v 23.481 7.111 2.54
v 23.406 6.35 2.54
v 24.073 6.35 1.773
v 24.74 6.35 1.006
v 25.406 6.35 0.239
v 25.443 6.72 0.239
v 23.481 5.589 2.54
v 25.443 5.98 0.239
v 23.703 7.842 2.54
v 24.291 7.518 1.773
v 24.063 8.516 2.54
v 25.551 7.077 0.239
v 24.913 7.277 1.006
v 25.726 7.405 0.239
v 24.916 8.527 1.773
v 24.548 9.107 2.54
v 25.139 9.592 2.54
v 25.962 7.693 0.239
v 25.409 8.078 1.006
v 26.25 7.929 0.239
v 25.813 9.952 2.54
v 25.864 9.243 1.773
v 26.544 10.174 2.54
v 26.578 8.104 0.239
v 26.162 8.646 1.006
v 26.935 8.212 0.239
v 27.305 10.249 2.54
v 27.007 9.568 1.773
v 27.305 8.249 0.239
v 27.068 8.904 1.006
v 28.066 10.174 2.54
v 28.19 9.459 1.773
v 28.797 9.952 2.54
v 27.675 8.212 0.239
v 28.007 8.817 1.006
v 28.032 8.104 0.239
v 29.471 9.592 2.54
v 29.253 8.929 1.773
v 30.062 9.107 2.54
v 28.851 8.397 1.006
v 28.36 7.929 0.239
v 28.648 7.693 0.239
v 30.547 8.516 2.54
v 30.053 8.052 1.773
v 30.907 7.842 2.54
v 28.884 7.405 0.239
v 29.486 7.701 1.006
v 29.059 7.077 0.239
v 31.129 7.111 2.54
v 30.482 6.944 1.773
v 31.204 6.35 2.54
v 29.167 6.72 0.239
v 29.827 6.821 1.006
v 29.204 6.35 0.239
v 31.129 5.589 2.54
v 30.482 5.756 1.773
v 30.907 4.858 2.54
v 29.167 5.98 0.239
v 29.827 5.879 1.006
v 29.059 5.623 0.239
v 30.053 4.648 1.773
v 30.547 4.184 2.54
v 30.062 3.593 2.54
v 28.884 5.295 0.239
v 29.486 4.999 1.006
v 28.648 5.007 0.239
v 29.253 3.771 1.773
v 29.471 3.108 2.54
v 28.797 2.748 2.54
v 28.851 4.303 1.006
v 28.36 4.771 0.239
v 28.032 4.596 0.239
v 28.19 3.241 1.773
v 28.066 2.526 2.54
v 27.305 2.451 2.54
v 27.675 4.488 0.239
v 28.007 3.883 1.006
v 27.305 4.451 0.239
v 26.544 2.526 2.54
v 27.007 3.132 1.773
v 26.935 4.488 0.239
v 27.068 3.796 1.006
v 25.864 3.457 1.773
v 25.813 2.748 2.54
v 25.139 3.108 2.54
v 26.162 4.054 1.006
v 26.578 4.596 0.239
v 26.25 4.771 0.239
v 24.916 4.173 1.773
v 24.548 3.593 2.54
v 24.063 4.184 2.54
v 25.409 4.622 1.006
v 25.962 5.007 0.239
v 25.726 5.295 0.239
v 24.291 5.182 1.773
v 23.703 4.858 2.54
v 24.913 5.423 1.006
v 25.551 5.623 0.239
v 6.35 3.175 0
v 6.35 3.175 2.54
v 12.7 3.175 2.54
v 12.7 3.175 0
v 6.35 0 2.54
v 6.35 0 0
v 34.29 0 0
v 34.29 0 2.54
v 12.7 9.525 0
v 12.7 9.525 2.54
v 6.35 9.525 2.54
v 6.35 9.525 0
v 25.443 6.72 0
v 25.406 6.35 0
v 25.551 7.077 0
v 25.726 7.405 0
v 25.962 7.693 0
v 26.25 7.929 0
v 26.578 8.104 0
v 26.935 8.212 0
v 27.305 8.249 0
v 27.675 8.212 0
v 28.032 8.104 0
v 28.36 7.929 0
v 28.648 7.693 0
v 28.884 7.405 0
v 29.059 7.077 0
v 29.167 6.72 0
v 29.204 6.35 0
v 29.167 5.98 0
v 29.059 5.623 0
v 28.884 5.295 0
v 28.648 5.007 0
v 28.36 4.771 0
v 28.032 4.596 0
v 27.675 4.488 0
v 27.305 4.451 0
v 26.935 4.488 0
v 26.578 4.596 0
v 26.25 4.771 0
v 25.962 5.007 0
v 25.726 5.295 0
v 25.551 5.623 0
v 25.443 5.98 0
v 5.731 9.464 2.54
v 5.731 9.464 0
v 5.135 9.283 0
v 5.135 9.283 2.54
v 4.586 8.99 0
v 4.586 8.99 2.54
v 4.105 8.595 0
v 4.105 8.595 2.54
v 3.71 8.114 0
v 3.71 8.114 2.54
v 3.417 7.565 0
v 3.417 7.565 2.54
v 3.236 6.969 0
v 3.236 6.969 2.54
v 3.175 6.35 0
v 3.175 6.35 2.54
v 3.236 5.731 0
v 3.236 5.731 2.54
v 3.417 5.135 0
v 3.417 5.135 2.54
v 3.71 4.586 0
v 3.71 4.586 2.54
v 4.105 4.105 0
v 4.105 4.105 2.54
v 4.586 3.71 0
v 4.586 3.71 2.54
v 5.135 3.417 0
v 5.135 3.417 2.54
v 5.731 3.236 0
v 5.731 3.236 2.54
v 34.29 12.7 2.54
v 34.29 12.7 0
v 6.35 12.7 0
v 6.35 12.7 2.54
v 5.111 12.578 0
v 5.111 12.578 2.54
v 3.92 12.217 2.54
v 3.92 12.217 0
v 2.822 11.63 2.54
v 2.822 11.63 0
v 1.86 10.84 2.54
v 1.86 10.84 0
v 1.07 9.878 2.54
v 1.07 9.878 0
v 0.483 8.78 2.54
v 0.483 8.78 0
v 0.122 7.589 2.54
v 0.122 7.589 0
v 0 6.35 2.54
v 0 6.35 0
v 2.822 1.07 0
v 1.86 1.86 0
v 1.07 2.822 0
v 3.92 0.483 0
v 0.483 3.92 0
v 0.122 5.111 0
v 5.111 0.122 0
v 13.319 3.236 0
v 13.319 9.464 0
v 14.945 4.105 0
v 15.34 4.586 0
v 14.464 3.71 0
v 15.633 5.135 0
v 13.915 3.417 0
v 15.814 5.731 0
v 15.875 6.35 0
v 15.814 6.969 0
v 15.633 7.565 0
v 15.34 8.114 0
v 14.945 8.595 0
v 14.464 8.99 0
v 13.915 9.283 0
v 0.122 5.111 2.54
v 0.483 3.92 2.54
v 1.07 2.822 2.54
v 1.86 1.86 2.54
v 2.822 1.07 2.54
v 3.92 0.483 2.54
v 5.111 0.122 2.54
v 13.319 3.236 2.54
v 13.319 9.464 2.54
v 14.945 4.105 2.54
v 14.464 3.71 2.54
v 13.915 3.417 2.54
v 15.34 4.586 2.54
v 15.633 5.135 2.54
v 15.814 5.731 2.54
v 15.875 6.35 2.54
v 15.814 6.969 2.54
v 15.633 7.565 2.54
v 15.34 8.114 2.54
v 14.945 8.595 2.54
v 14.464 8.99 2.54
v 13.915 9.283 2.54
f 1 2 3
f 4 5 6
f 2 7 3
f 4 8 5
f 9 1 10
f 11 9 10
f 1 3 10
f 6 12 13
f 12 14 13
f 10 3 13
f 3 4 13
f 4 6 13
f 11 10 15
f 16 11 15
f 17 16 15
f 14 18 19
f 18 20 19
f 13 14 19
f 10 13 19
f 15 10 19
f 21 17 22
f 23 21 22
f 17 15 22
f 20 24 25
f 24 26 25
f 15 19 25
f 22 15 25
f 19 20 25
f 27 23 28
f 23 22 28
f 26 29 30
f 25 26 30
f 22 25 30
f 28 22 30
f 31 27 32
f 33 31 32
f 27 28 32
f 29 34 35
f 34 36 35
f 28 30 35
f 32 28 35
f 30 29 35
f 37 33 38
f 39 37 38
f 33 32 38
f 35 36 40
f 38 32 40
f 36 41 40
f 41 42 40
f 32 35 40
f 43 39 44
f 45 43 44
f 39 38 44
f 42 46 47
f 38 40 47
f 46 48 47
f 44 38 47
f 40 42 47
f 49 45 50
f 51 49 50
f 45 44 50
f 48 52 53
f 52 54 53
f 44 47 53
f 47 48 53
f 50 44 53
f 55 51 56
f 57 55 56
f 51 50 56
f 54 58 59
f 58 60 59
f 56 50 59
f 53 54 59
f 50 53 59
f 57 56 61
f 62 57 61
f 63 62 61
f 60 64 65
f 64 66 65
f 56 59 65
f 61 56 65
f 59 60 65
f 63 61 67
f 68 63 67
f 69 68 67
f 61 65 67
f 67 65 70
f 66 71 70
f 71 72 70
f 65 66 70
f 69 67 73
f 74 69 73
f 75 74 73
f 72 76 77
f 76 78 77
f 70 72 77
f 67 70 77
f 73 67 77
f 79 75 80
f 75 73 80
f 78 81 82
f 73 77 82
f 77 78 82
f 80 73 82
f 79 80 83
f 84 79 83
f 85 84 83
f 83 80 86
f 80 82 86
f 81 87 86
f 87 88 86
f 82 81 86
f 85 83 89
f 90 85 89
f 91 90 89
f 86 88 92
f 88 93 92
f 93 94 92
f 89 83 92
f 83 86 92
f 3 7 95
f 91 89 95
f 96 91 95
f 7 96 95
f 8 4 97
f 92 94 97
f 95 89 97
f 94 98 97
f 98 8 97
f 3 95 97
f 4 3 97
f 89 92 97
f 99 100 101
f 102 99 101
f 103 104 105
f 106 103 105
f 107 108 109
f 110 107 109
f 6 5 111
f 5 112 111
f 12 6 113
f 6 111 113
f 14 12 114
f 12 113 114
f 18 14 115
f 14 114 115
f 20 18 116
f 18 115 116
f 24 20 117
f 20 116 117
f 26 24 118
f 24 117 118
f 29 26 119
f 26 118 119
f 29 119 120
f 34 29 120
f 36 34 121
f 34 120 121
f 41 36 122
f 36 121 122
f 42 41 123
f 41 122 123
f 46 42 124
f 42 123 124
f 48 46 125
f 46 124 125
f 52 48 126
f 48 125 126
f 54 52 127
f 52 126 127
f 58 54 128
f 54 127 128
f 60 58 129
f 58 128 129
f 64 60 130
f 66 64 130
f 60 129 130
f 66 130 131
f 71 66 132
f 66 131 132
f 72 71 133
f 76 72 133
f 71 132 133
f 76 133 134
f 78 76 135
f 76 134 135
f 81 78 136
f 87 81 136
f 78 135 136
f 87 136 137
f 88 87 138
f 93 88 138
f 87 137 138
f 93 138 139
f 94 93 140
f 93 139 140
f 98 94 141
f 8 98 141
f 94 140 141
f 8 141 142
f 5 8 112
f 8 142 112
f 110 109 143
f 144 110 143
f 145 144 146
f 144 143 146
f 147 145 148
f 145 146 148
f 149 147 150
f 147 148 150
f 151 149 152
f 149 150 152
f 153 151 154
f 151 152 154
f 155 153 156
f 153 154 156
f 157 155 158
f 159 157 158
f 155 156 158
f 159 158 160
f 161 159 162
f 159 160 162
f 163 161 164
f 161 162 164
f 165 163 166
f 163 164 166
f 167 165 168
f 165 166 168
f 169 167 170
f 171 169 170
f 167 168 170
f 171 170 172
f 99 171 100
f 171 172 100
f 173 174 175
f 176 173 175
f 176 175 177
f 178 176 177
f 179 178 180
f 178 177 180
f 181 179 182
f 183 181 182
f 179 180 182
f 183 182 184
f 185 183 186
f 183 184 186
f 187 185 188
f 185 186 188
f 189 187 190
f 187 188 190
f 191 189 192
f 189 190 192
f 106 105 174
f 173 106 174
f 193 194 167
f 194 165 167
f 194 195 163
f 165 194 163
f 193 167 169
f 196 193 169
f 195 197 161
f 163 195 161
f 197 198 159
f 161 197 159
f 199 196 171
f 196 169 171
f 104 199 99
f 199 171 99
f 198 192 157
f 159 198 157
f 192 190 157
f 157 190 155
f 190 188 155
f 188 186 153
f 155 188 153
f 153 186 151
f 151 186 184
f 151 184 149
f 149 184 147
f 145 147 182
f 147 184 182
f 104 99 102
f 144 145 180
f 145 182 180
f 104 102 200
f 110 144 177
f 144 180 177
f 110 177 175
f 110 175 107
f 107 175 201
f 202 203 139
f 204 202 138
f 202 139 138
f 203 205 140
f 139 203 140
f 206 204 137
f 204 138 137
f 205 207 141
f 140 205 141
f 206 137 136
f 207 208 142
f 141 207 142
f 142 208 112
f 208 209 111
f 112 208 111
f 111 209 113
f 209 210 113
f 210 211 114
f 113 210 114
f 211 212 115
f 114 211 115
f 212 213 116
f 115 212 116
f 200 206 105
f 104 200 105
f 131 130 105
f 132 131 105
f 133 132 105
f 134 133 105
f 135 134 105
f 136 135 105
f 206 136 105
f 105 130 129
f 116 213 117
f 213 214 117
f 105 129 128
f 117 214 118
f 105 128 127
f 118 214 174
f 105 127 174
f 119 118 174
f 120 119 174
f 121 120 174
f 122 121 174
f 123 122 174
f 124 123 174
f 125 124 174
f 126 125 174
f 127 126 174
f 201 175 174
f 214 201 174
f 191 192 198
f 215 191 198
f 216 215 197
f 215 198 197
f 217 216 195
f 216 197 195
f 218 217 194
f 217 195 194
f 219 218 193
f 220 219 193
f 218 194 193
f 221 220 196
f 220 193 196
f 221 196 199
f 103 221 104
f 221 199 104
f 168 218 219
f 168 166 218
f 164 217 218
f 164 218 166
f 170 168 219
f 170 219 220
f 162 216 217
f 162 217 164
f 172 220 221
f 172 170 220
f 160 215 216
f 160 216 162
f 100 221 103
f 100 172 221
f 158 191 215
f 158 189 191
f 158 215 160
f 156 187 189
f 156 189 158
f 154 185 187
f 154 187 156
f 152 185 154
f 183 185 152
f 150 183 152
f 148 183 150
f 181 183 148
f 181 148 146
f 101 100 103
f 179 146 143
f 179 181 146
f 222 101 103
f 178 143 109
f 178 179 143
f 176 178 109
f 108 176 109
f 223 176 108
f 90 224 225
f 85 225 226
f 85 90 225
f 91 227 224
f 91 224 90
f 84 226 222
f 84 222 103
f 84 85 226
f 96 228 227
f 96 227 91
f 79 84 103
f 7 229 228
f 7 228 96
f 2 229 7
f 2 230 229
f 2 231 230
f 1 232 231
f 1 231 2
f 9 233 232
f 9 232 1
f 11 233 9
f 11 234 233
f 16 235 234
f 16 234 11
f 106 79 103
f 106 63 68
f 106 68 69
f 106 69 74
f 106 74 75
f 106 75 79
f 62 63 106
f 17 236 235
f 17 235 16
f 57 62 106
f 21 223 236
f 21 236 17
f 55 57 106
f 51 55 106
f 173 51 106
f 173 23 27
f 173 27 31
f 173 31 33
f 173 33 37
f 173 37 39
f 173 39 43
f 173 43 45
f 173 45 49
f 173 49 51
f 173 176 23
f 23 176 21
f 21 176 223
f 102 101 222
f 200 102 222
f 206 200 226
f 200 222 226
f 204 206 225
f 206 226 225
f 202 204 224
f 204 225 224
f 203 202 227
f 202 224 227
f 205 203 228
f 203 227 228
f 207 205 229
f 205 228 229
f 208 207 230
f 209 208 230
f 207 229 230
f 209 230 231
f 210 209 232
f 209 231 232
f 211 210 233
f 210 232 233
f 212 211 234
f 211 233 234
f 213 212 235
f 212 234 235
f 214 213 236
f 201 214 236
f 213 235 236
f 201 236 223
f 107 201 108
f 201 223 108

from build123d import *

# Parameters (mm, degrees)
F1_DEPTH       = 2.54
F3_DEPTH       = 2.541
F5_D           = 3.7973
F5_CSINK_D     = 7.7978
F5_CSINK_ANGLE = 82


with BuildPart() as f1:
    # F0 (on Top) → F1 (new body)
    with BuildSketch(Plane.XY):
        with BuildLine():
            ThreePointArc((0, 6.35), (1.8598719395, 1.8598719395), (6.35, 0))
            Line((6.35, 0), (34.29, 0))
            Line((34.29, 0), (34.29, 12.7))
            Line((34.29, 12.7), (6.35, 12.7))
            ThreePointArc((6.35, 12.7), (1.8598719395, 10.8401280605), (0, 6.35))
        make_face()
    extrude(amount=F1_DEPTH)

    # F2 (on face) → F3 (cut, through all)
    with BuildSketch(Plane.XY.offset(2.54)):
        with BuildLine():
            Line((12.7, 9.525), (6.35, 9.525))
            ThreePointArc((6.35, 9.525), (3.175, 6.35), (6.35, 3.175))
            Line((6.35, 3.175), (12.7, 3.175))
            ThreePointArc((12.7, 3.175), (15.875, 6.35), (12.7, 9.525))
        make_face()
    extrude(amount=-F3_DEPTH, mode=Mode.SUBTRACT)

    # F5 (through all)
    with Locations(Plane.XY.offset(2.54)):
        with Locations((27.305, 6.35)):
            CounterSinkHole(F5_D / 2, F5_CSINK_D / 2, counter_sink_angle=F5_CSINK_ANGLE)


solid = f1.part
